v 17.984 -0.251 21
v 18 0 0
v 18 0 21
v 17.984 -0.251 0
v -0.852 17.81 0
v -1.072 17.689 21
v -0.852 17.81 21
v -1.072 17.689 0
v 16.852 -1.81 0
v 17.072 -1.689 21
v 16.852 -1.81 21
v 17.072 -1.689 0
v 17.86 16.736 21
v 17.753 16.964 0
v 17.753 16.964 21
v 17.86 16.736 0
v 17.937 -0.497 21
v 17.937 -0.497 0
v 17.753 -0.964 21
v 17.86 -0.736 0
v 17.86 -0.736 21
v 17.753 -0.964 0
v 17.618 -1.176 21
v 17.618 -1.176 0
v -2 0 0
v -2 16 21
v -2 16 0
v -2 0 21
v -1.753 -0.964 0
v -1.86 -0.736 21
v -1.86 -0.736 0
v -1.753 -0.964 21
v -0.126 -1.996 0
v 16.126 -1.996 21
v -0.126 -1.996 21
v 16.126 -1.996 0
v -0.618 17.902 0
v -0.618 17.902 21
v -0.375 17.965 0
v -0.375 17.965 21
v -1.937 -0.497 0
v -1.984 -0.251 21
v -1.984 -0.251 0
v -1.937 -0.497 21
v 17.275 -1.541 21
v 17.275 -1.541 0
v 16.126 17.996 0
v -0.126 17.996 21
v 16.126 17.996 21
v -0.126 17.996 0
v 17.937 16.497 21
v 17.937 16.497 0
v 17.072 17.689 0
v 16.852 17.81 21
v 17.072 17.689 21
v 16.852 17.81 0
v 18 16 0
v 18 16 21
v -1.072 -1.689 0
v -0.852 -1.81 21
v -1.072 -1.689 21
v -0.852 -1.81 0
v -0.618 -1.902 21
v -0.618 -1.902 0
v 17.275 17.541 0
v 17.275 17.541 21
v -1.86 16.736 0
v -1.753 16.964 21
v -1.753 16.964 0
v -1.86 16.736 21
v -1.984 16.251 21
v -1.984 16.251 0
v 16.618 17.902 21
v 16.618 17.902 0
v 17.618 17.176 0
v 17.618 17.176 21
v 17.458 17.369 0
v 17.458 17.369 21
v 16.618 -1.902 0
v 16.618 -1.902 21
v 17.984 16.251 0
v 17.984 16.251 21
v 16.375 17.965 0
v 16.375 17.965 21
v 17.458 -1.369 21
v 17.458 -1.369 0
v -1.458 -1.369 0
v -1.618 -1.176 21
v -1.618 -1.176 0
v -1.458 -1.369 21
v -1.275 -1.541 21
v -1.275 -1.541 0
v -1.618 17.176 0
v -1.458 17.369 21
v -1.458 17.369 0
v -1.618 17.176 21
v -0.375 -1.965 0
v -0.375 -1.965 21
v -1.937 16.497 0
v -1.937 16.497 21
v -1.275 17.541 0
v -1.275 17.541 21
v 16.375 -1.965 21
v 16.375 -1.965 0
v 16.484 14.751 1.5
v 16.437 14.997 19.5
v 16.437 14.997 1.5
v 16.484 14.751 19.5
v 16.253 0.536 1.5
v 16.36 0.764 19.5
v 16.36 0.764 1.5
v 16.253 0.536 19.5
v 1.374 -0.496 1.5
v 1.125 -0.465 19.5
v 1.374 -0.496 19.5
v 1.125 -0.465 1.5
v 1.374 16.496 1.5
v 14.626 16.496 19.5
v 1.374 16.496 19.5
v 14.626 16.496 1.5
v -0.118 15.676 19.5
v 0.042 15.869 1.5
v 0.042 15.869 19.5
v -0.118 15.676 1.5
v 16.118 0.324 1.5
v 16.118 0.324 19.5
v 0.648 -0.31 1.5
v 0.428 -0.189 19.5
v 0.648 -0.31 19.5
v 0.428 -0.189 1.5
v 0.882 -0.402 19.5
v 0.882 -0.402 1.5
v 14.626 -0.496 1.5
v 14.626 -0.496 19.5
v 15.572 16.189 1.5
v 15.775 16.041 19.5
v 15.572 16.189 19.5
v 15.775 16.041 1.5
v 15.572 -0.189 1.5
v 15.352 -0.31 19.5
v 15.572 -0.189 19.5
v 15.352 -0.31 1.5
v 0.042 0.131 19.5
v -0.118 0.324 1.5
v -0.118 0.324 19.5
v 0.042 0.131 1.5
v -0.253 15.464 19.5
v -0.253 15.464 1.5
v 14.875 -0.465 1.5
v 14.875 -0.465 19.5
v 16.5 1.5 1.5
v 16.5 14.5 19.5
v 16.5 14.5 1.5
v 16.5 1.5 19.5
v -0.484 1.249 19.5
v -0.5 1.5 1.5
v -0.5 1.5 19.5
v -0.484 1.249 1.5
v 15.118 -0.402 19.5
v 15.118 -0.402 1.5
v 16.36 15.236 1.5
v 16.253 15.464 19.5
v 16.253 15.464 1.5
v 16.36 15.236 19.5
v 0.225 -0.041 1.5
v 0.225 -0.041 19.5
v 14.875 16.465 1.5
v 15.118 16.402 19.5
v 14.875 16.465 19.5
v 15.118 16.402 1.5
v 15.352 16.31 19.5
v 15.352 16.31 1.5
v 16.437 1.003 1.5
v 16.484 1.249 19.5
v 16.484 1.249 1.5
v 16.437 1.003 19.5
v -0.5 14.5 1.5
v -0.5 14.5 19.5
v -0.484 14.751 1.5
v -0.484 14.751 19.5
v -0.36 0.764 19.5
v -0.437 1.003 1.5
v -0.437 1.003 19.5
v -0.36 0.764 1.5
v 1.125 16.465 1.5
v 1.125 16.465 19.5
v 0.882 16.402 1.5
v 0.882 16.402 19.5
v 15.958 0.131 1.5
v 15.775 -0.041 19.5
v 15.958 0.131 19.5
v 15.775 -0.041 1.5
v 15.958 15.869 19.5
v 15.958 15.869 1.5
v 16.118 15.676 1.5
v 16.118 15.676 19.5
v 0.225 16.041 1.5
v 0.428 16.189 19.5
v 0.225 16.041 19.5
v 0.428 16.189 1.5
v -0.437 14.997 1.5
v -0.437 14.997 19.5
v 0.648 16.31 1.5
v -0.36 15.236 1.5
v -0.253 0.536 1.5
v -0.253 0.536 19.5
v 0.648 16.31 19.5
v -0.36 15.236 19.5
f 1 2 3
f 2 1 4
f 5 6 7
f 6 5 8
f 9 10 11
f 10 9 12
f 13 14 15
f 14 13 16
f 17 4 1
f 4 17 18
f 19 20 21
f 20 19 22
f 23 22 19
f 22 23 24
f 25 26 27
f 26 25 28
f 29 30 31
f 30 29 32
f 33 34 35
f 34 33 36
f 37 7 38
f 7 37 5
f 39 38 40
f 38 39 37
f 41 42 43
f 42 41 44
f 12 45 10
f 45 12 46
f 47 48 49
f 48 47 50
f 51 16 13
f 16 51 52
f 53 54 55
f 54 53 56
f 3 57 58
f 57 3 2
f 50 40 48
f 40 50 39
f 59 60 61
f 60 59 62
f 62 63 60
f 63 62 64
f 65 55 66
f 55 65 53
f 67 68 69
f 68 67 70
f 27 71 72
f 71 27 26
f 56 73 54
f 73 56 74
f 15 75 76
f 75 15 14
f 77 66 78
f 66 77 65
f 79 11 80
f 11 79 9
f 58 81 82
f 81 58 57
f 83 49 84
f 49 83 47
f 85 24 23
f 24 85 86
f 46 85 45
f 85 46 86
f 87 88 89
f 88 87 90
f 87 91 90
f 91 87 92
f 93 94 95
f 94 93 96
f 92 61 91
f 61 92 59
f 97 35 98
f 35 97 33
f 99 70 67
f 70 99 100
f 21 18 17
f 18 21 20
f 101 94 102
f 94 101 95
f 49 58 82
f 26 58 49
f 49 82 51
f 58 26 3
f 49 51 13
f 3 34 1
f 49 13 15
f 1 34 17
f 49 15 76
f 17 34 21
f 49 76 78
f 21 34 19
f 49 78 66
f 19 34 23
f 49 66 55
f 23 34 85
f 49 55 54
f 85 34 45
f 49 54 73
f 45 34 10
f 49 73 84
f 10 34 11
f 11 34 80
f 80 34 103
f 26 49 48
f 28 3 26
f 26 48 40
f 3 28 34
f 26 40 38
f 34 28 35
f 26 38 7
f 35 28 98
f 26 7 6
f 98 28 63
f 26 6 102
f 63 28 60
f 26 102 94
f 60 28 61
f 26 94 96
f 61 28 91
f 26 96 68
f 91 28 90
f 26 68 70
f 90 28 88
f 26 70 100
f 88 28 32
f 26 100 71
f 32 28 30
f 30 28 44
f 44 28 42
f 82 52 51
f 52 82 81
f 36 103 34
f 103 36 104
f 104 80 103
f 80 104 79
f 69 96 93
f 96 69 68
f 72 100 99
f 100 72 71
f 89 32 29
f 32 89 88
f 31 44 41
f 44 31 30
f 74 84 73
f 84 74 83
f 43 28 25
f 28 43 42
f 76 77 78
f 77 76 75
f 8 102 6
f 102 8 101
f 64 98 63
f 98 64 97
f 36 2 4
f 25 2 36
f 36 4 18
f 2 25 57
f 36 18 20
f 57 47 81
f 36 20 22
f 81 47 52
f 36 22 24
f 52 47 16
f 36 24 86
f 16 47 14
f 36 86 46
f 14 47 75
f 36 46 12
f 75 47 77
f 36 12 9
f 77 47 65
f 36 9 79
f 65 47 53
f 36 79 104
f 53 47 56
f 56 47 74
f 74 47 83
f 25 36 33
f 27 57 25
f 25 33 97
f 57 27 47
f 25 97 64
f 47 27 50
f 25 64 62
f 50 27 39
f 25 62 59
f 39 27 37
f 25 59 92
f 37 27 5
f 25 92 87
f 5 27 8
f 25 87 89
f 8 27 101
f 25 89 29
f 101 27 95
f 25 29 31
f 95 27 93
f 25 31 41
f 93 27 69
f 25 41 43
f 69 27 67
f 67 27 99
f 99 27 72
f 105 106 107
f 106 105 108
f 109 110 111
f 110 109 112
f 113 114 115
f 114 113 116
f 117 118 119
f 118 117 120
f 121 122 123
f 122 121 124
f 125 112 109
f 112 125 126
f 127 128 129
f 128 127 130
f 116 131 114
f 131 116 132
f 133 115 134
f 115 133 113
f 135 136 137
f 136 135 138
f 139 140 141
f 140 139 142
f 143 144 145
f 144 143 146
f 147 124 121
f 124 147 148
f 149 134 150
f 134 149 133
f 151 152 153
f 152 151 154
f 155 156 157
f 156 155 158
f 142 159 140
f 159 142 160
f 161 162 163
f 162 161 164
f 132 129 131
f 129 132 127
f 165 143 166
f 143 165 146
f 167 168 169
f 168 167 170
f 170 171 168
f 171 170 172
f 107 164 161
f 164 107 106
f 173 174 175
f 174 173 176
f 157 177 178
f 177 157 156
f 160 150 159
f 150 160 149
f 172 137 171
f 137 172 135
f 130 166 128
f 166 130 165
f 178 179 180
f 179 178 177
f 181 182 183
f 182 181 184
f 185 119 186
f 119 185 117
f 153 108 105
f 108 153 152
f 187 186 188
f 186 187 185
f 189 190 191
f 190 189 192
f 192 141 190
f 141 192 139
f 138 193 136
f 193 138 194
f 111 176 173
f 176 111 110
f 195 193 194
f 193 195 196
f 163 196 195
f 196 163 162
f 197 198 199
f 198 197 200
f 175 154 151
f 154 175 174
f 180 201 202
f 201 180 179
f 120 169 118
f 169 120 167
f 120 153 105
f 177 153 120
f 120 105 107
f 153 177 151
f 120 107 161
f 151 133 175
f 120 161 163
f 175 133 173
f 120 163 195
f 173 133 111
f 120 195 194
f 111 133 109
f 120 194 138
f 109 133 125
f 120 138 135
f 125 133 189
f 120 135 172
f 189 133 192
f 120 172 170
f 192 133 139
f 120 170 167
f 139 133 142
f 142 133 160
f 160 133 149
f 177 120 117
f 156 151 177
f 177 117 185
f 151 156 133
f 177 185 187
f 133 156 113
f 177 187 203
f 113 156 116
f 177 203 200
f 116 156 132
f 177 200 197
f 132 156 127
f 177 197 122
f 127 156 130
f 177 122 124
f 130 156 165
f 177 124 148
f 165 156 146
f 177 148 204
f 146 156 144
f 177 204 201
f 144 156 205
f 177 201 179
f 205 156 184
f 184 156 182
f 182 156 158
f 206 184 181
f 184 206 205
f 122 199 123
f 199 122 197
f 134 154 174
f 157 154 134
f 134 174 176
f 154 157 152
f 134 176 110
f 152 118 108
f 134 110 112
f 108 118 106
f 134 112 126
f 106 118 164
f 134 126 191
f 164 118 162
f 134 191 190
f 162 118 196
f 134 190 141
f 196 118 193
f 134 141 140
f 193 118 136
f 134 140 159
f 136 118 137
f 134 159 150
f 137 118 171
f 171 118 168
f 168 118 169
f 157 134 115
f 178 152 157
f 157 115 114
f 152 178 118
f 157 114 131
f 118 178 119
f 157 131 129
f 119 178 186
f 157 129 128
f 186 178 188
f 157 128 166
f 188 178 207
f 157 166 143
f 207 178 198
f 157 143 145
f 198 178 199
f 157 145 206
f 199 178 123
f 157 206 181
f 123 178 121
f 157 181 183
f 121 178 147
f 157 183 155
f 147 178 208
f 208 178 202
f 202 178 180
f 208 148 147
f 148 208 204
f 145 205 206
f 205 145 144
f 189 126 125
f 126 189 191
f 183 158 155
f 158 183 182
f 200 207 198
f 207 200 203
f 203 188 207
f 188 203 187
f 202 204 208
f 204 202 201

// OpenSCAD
wanddicke=1.5;
//Außenmaße
hoehe=20;
breite=20-2*2;
laenge=20-2*2;
$fn=50;

difference(){
    minkowski(){
        cube([breite,laenge,hoehe]);
        cylinder(r=2,h=1);
    }
    translate([wanddicke,wanddicke,wanddicke]){
        minkowski(){
            cube([breite-2*wanddicke,laenge-2*wanddicke,hoehe-2*wanddicke]);
            cylinder(r=2,h=1);
        }
    }
}
